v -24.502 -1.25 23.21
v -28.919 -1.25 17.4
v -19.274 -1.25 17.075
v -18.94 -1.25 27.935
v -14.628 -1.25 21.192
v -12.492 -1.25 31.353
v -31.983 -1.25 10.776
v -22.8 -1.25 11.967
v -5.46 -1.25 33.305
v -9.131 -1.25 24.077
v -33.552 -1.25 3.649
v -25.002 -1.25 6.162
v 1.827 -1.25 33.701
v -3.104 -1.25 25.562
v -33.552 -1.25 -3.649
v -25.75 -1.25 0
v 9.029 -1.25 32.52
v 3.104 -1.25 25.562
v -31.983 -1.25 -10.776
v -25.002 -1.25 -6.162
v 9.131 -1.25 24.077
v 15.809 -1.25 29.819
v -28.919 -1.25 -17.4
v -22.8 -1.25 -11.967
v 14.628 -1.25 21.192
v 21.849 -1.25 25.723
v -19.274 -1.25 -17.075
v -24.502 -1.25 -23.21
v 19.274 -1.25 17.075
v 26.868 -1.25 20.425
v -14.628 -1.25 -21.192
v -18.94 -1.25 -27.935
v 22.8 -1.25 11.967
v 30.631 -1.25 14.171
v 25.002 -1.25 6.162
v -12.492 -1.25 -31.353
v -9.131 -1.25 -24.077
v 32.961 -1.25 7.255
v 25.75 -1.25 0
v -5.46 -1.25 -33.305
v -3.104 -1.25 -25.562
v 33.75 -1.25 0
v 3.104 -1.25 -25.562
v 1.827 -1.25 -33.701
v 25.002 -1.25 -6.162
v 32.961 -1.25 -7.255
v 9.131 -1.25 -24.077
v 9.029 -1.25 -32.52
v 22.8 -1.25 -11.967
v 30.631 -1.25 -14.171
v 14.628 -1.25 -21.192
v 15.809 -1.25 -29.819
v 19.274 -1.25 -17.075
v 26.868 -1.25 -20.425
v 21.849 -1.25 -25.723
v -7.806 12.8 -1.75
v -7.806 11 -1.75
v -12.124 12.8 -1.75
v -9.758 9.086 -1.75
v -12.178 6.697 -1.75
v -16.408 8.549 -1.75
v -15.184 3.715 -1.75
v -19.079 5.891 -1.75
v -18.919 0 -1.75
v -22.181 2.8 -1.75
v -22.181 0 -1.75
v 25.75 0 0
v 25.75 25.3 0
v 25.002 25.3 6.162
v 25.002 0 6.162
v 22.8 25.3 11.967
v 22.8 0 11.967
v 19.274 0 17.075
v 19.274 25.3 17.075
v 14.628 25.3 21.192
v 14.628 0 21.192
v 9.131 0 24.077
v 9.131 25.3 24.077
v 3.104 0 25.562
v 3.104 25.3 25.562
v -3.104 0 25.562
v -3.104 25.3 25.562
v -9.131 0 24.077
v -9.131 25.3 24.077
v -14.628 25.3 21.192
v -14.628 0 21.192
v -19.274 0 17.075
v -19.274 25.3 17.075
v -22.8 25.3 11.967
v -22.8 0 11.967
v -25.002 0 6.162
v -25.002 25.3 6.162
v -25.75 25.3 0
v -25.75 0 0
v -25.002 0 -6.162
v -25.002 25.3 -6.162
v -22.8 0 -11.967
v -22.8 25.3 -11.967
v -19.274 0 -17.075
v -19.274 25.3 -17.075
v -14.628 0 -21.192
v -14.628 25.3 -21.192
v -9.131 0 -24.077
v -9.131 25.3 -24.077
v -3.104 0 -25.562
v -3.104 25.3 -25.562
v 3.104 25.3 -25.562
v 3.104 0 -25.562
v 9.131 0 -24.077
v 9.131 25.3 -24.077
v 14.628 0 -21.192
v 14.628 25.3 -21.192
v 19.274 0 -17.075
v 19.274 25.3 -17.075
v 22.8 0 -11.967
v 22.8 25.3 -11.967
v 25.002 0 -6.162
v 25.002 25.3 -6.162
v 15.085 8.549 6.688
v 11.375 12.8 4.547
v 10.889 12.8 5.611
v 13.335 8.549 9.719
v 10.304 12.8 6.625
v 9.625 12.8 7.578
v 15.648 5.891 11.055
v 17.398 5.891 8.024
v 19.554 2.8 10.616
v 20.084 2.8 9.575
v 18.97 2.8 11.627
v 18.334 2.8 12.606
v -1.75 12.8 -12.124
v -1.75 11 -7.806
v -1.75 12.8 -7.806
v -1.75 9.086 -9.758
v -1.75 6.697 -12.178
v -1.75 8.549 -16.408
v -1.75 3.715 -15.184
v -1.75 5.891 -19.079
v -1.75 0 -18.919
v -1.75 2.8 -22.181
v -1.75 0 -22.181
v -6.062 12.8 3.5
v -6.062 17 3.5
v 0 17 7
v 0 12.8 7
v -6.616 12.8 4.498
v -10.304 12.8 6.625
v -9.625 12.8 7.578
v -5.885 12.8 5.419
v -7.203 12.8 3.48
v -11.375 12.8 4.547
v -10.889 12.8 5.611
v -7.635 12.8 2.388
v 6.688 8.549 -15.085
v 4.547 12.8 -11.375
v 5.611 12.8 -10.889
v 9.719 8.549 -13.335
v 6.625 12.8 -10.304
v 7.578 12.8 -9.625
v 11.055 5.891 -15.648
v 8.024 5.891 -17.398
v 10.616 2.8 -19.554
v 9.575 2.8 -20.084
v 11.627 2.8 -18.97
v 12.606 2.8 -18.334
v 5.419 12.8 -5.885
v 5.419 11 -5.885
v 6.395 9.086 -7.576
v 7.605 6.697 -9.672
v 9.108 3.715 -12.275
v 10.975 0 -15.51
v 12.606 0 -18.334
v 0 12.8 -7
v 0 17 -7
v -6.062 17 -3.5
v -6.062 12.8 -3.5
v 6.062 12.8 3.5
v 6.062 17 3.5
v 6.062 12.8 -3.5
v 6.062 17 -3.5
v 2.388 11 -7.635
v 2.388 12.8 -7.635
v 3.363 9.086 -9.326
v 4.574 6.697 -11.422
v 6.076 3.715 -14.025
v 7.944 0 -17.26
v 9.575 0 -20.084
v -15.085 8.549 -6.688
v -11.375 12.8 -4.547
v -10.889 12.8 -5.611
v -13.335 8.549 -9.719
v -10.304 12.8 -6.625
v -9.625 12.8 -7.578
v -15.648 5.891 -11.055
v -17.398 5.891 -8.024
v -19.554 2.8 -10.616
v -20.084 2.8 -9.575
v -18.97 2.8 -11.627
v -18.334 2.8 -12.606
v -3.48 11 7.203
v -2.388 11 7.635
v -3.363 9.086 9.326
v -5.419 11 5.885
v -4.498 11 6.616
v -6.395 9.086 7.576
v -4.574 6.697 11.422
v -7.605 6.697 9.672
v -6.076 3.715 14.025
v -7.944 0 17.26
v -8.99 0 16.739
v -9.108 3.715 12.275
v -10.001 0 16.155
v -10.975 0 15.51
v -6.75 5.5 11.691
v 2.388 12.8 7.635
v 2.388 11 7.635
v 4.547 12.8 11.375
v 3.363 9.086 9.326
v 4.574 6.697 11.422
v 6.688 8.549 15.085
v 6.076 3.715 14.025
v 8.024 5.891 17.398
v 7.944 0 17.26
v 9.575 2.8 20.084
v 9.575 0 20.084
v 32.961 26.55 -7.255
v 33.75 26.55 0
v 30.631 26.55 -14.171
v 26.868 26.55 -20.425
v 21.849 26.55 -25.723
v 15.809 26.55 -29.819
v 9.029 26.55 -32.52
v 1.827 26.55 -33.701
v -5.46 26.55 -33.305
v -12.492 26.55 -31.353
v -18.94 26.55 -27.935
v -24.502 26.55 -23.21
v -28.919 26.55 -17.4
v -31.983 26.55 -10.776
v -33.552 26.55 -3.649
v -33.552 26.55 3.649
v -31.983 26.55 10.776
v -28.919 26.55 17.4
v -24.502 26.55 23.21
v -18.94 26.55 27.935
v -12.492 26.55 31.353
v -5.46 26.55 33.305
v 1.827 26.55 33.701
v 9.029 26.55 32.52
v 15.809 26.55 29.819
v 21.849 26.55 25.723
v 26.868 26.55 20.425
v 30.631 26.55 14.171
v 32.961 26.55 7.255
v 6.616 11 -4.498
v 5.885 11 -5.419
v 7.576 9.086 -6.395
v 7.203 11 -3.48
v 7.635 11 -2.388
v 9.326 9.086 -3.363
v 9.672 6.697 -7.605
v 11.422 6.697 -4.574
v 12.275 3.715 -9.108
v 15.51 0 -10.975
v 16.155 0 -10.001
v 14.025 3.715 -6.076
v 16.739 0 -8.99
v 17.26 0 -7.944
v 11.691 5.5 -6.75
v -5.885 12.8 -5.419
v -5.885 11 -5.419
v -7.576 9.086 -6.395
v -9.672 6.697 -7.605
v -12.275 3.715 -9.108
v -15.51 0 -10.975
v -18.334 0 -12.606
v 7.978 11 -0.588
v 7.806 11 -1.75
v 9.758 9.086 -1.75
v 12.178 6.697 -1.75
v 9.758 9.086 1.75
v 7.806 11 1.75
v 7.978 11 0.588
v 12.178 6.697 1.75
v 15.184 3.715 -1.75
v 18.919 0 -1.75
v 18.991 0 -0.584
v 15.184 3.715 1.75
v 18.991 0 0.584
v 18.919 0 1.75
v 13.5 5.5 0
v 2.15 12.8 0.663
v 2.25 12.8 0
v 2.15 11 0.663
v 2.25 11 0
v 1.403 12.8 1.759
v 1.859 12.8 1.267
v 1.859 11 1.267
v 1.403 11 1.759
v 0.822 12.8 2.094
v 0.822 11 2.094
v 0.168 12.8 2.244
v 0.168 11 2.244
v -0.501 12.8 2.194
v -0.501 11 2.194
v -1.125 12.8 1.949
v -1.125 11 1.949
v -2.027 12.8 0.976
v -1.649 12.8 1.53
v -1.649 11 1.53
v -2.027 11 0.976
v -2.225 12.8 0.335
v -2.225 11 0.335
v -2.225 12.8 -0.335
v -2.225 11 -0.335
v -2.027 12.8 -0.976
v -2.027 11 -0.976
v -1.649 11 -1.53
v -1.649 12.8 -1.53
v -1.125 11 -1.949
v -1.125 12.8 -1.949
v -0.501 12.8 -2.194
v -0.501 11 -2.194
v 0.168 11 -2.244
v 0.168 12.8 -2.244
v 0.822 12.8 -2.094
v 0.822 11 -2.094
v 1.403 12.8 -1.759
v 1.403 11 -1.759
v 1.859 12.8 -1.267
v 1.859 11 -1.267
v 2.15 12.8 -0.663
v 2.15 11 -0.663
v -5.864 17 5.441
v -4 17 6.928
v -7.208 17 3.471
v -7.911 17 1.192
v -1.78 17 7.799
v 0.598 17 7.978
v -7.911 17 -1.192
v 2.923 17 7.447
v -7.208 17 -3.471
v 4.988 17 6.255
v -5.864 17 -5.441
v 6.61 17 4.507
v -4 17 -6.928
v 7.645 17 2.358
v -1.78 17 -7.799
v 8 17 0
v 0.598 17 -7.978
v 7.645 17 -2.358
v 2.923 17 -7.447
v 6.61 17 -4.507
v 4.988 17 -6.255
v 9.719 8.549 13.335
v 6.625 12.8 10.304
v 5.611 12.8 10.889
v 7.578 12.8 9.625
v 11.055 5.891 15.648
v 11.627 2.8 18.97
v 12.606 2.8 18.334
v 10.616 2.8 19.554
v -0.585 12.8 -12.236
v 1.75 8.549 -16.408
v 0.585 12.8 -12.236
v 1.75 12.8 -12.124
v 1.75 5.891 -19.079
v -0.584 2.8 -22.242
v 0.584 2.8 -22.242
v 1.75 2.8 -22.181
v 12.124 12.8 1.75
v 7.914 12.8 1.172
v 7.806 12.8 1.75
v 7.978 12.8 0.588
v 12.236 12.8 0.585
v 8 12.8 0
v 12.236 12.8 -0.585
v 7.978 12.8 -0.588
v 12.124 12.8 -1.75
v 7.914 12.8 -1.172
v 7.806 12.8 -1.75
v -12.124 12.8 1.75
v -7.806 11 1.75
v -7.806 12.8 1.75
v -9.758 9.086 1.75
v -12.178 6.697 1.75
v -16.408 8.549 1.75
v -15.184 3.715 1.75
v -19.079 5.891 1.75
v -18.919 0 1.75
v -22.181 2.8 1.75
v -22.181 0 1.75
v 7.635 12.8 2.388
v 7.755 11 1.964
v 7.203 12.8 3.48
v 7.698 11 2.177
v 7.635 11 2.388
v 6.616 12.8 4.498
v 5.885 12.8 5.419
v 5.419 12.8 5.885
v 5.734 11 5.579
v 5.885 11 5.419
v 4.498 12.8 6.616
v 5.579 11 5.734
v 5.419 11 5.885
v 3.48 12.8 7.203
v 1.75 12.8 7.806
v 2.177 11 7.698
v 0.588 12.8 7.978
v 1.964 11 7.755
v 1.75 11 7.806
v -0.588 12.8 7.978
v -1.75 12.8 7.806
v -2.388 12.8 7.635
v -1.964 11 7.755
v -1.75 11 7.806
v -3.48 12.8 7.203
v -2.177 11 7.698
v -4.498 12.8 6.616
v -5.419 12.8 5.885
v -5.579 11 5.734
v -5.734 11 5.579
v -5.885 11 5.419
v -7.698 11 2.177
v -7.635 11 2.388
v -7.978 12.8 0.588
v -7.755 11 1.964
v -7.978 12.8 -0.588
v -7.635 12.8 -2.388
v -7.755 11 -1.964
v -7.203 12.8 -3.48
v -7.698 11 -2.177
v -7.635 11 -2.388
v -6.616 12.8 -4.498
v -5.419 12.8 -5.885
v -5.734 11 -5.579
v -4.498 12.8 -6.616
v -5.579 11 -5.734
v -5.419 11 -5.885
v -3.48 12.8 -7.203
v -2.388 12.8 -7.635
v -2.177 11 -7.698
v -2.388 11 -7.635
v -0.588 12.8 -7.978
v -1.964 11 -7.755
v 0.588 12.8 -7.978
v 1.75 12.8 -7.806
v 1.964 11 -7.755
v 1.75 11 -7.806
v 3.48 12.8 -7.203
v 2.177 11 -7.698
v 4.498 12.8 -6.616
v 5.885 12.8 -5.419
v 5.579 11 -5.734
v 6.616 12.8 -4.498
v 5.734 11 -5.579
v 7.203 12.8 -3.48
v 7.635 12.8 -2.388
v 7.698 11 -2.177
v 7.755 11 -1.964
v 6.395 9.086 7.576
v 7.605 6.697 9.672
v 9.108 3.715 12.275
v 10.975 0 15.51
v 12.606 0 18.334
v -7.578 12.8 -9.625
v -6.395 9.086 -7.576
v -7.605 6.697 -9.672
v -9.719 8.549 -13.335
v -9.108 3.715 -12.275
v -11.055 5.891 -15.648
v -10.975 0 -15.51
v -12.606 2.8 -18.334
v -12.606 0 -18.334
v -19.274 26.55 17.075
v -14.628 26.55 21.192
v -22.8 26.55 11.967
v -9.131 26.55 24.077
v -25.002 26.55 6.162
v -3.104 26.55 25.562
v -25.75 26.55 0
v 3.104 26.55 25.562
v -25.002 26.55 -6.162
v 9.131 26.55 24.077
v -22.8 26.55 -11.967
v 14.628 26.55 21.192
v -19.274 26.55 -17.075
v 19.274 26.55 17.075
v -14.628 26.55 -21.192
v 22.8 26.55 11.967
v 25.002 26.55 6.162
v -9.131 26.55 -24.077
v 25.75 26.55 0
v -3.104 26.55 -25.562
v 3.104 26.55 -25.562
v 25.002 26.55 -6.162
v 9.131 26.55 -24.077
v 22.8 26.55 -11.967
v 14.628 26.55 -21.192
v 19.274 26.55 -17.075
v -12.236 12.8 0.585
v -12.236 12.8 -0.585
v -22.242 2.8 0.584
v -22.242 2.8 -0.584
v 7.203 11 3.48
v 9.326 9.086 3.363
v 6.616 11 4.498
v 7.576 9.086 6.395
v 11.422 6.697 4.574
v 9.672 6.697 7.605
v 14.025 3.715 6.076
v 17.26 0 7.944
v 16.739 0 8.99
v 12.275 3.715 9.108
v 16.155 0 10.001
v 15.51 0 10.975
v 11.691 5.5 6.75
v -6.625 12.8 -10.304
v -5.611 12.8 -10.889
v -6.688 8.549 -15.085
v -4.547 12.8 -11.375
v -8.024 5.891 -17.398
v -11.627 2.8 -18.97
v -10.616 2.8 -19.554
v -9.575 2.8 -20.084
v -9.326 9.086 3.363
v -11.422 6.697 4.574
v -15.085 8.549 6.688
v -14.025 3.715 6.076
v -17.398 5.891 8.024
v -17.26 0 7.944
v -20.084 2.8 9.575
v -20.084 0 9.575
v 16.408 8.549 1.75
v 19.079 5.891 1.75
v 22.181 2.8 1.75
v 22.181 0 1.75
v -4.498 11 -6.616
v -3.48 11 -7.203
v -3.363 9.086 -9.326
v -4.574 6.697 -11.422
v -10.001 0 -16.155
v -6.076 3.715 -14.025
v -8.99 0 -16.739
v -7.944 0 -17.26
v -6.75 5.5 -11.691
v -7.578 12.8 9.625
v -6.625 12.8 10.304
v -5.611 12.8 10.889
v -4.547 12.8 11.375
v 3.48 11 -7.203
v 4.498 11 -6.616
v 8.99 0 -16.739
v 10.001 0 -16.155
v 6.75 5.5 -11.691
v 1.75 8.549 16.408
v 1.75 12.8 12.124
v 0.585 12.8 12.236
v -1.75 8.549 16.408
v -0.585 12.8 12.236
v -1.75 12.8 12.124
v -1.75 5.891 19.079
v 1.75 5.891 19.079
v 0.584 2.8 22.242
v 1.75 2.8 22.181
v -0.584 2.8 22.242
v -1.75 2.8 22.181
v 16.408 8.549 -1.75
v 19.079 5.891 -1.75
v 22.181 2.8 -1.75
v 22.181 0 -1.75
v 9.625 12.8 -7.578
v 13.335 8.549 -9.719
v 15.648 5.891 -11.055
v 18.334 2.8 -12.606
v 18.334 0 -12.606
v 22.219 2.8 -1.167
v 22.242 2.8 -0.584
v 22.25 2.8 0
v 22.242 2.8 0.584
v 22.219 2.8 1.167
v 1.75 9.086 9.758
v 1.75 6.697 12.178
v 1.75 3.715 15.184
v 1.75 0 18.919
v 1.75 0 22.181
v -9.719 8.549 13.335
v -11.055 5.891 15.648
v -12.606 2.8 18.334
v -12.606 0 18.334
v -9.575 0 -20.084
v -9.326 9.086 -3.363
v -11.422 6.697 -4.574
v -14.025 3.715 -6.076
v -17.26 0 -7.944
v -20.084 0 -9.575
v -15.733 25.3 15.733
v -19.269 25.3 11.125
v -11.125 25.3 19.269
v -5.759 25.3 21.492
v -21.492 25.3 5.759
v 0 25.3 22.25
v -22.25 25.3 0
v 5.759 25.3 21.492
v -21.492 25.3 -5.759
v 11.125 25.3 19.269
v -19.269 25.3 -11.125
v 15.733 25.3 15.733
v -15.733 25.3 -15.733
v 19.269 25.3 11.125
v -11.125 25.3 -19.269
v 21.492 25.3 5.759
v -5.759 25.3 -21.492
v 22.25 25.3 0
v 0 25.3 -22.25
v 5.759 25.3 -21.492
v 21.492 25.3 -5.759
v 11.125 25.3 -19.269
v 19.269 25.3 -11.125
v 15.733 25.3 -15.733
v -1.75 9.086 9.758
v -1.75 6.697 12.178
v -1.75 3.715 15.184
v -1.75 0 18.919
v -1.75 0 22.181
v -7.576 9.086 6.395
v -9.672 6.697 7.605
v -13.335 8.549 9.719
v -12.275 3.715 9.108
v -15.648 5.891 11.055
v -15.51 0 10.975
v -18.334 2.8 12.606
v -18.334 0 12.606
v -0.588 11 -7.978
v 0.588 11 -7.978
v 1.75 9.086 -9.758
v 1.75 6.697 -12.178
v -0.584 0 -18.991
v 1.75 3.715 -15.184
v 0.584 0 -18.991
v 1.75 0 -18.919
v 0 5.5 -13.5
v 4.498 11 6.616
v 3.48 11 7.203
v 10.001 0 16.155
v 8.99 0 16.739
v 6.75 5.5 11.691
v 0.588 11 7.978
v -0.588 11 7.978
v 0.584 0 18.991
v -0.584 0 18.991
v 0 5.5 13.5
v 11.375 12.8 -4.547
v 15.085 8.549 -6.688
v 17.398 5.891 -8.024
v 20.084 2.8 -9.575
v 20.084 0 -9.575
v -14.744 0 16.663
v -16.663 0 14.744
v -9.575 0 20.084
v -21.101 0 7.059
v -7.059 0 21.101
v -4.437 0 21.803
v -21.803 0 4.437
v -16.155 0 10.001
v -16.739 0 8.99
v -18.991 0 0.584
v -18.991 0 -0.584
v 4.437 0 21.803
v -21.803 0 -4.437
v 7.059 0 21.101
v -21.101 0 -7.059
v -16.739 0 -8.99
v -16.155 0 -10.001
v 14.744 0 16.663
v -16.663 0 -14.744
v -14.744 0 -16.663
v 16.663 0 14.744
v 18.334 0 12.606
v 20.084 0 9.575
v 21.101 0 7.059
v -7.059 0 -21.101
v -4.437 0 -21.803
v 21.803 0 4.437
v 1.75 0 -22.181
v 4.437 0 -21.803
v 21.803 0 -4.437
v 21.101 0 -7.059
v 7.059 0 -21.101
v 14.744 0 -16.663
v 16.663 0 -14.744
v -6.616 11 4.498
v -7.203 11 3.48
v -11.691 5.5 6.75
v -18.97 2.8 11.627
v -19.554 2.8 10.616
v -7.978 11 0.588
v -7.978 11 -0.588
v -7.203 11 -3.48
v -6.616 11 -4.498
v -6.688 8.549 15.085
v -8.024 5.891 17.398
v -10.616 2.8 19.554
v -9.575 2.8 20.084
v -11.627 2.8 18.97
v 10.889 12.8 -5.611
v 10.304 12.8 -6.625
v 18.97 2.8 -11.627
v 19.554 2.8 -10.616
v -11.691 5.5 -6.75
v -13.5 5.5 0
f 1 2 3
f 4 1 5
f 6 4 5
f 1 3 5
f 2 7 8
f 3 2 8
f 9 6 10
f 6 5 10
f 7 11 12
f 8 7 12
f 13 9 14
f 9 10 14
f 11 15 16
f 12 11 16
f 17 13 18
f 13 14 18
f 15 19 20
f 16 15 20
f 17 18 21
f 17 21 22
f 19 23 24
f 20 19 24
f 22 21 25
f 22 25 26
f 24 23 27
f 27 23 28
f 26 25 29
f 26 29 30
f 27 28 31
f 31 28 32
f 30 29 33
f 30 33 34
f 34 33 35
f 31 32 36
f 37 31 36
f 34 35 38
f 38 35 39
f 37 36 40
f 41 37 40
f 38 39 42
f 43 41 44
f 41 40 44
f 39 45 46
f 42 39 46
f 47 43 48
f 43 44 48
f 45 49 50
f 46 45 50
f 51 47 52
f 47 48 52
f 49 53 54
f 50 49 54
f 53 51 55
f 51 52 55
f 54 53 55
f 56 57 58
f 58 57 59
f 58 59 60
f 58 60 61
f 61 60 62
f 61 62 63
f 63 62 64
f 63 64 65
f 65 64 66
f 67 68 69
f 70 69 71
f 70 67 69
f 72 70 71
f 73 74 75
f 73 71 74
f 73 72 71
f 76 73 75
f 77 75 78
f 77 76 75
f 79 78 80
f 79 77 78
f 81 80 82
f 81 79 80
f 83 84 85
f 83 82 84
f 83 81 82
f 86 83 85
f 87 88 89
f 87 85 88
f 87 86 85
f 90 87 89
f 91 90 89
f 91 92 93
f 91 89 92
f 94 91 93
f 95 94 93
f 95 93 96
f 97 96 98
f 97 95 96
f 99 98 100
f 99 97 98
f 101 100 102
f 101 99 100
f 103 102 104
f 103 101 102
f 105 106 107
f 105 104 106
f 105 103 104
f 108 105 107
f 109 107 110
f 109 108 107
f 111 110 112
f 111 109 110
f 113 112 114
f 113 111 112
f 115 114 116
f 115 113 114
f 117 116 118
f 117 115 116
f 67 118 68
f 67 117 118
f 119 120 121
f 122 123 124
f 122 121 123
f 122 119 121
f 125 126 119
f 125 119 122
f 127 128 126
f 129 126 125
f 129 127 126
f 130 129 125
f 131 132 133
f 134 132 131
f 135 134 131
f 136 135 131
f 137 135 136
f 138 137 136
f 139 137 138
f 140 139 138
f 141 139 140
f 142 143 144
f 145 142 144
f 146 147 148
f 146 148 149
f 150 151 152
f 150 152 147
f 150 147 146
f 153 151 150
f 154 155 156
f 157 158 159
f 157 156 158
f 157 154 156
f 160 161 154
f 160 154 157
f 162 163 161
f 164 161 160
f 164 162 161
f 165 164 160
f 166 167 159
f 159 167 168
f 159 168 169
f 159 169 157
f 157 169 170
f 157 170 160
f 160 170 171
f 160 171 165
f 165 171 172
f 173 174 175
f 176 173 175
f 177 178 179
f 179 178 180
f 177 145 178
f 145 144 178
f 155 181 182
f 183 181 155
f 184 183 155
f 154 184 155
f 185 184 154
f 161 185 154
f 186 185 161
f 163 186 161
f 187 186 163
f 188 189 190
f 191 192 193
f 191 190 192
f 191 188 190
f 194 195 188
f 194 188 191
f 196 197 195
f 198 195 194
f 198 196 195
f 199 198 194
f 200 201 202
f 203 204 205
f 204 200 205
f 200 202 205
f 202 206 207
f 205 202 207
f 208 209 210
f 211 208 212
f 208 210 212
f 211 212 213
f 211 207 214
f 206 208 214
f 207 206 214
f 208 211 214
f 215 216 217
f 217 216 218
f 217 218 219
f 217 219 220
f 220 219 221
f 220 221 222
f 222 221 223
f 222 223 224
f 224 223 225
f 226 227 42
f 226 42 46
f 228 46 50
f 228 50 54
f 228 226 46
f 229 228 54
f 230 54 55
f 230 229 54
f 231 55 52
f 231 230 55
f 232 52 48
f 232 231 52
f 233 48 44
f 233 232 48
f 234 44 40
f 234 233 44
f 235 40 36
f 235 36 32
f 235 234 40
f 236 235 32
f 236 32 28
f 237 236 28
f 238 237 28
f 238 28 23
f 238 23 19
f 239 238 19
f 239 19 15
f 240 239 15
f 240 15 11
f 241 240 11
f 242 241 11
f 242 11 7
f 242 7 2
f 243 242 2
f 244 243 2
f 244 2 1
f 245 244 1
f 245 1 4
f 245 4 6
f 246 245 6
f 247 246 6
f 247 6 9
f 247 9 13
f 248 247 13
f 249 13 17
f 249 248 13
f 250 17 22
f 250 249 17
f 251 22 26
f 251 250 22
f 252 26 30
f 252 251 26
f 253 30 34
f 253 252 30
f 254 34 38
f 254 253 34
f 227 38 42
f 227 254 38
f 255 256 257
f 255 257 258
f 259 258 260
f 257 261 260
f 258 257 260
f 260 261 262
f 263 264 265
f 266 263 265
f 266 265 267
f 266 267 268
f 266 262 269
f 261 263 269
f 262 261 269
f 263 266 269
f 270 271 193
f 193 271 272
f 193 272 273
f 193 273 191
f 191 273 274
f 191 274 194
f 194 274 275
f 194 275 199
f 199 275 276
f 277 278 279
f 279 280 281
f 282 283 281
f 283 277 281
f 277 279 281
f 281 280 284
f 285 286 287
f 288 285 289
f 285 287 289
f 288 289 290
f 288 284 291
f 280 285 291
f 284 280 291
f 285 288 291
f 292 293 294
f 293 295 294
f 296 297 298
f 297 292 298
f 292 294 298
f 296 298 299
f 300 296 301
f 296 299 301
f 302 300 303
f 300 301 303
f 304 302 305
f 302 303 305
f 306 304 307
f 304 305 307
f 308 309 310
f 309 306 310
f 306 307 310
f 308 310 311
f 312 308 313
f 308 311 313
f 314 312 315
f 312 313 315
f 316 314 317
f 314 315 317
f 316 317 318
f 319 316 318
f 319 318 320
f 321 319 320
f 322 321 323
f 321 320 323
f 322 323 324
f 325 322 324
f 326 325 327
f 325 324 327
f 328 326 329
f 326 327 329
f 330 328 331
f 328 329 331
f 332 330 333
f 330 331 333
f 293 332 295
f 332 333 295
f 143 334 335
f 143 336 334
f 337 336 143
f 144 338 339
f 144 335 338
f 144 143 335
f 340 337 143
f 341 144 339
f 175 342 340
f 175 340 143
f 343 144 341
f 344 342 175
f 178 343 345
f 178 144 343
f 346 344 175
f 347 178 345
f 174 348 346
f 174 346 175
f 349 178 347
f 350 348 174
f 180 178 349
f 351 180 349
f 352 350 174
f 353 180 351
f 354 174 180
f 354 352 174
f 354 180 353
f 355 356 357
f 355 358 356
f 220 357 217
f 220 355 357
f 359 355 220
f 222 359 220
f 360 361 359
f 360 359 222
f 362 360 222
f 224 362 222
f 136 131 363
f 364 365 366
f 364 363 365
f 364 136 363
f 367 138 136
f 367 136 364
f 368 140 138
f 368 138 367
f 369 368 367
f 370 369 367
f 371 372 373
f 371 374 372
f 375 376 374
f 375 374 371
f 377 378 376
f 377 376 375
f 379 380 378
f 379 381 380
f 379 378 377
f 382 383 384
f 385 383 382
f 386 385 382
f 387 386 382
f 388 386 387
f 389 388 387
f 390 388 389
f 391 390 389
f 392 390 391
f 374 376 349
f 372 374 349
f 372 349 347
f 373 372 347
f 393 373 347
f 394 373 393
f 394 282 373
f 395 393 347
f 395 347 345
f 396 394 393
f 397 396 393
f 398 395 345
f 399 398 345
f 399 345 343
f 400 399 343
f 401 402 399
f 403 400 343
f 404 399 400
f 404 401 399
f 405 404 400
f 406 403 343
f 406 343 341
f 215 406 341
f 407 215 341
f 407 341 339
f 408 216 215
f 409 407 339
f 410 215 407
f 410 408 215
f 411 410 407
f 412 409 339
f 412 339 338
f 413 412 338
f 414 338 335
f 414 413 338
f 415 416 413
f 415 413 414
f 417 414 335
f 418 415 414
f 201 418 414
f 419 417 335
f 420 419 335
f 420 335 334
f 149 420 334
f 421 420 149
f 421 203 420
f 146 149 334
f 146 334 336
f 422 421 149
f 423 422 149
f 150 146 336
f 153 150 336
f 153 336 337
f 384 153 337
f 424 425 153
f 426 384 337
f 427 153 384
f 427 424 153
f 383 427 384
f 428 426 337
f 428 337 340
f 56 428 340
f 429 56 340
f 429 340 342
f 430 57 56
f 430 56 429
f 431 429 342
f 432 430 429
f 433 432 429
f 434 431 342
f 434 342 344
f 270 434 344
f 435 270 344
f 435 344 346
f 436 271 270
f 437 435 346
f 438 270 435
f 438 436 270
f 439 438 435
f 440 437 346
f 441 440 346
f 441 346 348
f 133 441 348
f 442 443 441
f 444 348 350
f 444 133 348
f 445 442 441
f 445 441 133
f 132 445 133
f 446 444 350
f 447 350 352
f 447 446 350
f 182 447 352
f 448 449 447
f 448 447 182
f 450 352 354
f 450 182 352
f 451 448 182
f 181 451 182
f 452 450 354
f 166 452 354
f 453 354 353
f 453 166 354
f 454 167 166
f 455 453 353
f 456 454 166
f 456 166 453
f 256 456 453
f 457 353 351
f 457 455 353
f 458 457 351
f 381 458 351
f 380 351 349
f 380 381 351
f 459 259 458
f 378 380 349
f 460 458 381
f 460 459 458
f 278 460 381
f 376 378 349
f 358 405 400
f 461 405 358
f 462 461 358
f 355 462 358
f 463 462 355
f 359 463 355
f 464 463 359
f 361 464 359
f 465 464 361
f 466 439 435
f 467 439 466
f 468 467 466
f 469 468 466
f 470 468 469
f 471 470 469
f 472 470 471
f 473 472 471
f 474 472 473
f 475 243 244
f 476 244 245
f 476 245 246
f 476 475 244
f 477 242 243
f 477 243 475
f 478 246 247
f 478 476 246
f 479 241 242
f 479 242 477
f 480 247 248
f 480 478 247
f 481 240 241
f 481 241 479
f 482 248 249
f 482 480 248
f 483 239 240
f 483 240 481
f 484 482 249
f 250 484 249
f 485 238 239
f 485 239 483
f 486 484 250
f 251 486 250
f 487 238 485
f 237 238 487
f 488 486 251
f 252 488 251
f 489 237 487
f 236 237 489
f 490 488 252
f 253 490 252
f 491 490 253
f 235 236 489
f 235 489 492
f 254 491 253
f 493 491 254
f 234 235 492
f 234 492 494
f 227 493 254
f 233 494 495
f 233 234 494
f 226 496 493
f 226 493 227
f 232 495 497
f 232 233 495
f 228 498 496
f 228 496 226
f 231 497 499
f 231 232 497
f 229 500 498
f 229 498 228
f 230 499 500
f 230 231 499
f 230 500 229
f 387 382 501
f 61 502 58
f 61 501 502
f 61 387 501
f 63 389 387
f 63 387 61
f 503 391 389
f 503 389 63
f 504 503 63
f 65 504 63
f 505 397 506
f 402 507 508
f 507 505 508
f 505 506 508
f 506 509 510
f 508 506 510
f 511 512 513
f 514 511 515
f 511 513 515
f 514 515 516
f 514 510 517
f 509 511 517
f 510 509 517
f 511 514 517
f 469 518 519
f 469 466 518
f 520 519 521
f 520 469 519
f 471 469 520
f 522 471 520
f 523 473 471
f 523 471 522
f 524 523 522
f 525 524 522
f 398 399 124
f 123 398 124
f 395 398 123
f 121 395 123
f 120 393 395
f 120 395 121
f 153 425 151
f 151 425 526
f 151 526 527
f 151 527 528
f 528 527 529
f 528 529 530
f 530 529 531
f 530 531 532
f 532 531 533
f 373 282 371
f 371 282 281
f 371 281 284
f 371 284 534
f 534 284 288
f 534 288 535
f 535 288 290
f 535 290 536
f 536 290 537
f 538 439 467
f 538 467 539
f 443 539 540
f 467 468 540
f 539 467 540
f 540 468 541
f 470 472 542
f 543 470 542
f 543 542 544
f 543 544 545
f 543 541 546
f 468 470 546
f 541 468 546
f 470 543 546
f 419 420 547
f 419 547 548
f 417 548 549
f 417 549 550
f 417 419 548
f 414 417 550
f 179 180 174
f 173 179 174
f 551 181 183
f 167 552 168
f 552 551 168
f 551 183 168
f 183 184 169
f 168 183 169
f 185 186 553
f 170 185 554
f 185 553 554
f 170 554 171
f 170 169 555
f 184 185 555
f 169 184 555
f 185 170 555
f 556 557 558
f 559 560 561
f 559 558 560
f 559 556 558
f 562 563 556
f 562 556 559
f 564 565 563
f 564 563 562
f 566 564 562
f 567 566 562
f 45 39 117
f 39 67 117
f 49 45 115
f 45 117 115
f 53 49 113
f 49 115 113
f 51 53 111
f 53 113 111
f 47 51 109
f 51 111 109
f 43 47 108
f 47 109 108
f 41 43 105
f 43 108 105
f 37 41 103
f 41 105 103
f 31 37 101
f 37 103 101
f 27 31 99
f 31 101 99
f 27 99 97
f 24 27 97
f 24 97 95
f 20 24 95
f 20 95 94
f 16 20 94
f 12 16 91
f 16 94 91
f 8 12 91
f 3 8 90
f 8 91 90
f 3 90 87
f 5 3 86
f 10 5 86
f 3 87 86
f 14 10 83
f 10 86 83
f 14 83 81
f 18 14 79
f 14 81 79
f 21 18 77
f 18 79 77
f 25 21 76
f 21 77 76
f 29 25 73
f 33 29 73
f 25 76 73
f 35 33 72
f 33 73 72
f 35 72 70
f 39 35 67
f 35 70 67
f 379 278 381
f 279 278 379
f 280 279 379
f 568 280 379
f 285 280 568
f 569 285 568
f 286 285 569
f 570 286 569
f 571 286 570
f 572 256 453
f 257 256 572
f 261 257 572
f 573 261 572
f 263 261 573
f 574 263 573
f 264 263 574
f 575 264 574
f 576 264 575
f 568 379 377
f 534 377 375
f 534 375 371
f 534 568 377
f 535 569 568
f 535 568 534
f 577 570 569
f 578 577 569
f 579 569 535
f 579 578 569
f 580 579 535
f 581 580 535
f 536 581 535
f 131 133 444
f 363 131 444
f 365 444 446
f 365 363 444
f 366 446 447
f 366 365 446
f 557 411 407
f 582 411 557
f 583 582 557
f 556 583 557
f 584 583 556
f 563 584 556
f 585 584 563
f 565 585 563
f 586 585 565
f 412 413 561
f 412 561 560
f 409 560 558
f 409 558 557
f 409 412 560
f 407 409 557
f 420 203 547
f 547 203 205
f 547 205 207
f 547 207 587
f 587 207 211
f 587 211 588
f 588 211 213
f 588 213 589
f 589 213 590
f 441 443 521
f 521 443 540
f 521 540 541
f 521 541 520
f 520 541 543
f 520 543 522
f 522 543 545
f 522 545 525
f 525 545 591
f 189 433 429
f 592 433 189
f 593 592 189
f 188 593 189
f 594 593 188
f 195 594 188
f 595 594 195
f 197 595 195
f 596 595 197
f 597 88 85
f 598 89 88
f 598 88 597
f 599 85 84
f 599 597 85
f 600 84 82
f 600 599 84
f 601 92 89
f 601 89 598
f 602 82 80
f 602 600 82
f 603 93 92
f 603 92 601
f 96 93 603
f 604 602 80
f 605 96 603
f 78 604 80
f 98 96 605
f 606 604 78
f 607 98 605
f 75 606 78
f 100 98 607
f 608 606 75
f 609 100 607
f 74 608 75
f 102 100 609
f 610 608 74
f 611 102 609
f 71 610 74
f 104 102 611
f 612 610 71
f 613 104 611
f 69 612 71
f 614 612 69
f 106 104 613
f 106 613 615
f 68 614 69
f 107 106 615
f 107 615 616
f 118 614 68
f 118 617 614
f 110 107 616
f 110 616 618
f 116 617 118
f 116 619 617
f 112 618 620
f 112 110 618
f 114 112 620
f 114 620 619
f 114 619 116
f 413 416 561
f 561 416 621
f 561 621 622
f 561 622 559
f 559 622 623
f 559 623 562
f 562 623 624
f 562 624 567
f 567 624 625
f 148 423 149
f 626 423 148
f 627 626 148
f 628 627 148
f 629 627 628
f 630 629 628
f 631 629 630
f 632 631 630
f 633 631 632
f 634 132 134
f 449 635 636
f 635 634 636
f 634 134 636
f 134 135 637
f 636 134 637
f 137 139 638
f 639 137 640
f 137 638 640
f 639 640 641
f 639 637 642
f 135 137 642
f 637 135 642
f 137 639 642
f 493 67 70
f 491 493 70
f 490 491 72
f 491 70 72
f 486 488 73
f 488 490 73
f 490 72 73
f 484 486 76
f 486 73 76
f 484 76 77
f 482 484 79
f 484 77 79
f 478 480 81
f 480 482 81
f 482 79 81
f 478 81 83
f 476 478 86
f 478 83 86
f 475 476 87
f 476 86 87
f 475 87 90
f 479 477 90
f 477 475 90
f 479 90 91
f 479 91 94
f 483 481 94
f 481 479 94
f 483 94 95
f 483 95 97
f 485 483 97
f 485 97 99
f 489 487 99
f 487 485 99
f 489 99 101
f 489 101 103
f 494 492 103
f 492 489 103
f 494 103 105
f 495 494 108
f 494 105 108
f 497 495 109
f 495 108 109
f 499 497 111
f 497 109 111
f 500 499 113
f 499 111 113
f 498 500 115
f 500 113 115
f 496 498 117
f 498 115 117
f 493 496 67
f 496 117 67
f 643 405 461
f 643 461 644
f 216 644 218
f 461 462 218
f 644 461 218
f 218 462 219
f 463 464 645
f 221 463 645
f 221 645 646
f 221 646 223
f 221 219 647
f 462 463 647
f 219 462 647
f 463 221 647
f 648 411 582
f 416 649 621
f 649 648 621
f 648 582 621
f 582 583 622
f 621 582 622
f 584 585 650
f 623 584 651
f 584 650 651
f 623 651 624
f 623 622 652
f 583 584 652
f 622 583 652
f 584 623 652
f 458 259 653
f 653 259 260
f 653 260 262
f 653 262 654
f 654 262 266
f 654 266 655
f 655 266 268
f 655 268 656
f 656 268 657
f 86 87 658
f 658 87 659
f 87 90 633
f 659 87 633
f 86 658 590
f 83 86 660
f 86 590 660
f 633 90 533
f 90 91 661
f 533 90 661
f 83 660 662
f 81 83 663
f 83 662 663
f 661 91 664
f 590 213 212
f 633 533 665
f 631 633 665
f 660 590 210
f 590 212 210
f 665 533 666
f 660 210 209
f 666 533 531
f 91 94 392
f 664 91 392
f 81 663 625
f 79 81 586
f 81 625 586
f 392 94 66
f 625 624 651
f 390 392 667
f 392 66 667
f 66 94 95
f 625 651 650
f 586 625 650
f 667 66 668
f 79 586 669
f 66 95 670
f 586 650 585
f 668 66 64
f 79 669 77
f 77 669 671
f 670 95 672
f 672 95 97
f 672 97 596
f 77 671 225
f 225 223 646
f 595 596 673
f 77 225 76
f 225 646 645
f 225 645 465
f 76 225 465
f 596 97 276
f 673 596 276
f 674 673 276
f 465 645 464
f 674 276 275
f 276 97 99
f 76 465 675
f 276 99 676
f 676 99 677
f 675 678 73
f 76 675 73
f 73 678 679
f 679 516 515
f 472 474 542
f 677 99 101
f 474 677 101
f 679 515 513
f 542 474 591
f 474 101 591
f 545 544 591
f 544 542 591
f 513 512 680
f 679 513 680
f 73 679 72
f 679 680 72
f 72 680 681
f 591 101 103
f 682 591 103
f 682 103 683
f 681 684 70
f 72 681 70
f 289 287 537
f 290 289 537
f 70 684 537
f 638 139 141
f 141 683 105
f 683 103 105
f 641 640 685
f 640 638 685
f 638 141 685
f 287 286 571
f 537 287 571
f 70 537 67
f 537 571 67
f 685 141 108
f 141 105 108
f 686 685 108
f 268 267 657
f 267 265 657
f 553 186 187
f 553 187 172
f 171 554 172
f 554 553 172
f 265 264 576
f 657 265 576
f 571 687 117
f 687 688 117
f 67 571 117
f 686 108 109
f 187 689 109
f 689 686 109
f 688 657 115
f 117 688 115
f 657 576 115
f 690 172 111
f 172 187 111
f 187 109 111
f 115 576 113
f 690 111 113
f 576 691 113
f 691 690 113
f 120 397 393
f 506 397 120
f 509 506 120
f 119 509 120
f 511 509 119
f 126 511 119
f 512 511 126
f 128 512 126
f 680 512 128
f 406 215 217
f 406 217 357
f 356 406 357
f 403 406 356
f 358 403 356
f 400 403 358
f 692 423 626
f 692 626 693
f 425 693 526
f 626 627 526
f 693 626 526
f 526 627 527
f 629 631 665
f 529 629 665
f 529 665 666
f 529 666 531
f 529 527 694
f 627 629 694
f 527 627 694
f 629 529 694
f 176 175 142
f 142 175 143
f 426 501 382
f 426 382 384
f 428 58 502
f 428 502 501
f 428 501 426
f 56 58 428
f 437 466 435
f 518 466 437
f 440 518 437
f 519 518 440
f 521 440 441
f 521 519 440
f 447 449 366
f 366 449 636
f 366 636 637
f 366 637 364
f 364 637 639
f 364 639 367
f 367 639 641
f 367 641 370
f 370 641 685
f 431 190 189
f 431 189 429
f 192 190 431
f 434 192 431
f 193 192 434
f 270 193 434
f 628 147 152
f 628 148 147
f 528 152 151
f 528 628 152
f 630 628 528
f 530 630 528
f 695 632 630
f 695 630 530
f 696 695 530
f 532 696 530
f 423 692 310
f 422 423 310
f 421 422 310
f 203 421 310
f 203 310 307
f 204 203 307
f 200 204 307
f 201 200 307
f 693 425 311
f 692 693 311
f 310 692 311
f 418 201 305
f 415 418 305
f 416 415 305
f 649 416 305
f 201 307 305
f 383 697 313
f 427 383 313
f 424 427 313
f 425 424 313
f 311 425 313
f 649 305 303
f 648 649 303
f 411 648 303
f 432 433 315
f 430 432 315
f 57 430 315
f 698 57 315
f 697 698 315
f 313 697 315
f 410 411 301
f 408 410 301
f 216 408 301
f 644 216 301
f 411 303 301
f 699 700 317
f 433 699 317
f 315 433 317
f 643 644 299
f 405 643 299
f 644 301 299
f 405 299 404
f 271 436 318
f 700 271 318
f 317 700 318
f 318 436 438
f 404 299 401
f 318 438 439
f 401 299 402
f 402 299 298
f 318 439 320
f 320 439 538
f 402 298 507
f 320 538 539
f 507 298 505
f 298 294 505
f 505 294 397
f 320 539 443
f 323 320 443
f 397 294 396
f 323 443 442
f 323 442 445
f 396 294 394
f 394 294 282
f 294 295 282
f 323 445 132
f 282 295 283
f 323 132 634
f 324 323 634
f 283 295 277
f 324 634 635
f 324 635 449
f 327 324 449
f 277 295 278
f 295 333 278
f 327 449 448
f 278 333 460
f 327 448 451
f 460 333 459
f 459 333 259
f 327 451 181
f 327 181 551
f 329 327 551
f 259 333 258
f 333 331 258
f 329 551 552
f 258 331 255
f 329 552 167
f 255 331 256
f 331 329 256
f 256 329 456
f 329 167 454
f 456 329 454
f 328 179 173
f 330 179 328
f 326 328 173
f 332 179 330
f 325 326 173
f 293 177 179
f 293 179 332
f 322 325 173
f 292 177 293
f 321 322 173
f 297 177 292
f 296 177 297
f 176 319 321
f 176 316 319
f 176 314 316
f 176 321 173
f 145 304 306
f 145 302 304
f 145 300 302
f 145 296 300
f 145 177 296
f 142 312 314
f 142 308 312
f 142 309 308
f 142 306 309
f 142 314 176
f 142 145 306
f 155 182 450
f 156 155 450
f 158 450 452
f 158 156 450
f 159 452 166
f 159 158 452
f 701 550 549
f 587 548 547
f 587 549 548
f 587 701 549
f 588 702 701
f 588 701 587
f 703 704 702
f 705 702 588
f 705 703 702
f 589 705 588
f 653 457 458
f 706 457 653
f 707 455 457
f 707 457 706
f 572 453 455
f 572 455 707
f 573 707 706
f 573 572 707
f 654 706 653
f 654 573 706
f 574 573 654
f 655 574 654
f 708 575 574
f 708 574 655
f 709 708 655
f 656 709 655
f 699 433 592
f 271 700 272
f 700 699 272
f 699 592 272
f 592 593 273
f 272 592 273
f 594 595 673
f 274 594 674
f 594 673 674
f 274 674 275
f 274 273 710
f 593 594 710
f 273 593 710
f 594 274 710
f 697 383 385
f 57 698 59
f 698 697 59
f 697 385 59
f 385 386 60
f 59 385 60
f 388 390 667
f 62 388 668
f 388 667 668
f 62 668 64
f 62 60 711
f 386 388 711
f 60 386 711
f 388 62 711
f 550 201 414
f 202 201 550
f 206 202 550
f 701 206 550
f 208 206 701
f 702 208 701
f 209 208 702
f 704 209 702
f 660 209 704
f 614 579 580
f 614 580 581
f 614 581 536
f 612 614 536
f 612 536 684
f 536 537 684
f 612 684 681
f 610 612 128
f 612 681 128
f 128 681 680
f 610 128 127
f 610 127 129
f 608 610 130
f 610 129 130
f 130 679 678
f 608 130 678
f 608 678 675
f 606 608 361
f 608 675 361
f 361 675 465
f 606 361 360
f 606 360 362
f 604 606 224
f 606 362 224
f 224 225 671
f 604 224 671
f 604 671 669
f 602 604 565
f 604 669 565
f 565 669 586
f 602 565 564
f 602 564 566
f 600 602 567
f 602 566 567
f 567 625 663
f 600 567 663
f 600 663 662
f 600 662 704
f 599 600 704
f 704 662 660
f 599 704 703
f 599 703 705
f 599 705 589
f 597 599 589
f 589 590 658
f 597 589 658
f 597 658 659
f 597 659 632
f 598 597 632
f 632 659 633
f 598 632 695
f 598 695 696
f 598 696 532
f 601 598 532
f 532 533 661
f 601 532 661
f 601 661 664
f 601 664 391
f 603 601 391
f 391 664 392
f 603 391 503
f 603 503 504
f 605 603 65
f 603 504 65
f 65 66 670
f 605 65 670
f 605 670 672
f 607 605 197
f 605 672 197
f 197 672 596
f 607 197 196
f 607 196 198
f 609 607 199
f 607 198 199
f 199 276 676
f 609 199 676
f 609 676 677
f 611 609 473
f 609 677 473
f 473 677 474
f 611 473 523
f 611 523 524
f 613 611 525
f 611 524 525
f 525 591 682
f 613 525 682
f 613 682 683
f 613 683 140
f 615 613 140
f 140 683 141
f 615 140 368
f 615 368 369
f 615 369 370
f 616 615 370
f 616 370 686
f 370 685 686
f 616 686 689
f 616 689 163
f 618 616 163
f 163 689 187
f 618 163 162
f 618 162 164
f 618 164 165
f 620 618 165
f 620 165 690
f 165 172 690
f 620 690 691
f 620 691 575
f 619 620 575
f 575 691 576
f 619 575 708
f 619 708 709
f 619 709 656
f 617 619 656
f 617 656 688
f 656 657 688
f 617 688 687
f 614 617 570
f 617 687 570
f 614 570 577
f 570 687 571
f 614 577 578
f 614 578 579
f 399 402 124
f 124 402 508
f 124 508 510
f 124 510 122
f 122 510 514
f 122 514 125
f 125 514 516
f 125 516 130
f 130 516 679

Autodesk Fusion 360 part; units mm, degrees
sketch "Sketch1" plane through (0, 0, 0) normal (0, 1, 0) x (1, 0, 0) in component "hub"
  circle A0 centre (0, 0) radius 25.75
  circle A1 centre (0, 0) radius 2.25
  circle A2 centre (0, 0) radius 22.25
  circle A3 centre (0, 0) radius 8
  line L0 (0, 0) -> (1.75, 0) construction
  line L1 (0, 0) -> (-1.75, 0) construction
  line L2 (-1.75, 0) -> (-1.75, -7.8062) construction
  line L3 (1.75, 0) -> (1.75, -7.8062) construction
  line L4 (-1.75, -7.8062) -> (-1.75, -22.1811)
  line L5 (1.75, -7.8062) -> (1.75, -22.1811)
  line L6 (2.3876, -7.6354) -> (9.575, -20.0844)
  line L7 (5.4187, -5.8854) -> (12.6061, -18.3344)
  line L8 (5.8854, -5.4187) -> (18.3344, -12.6061)
  line L9 (7.6354, -2.3876) -> (20.0844, -9.575)
  line L10 (7.8062, -1.75) -> (22.1811, -1.75)
  line L11 (7.8062, 1.75) -> (22.1811, 1.75)
  line L12 (7.6354, 2.3876) -> (20.0844, 9.575)
  line L13 (5.8854, 5.4187) -> (18.3344, 12.6061)
  line L14 (5.4187, 5.8854) -> (12.6061, 18.3344)
  line L15 (2.3876, 7.6354) -> (9.575, 20.0844)
  line L16 (1.75, 7.8062) -> (1.75, 22.1811)
  line L17 (-1.75, 7.8062) -> (-1.75, 22.1811)
  line L18 (-2.3876, 7.6354) -> (-9.575, 20.0844)
  line L19 (-5.4187, 5.8854) -> (-12.6061, 18.3344)
  line L20 (-5.8854, 5.4187) -> (-18.3344, 12.6061)
  line L21 (-7.6354, 2.3876) -> (-20.0844, 9.575)
  line L22 (-7.8062, 1.75) -> (-22.1811, 1.75)
  line L23 (-7.8062, -1.75) -> (-22.1811, -1.75)
  line L24 (-7.6354, -2.3876) -> (-20.0844, -9.575)
  line L25 (-5.8854, -5.4187) -> (-18.3344, -12.6061)
  line L26 (-5.4187, -5.8854) -> (-12.6061, -18.3344)
  line L27 (-2.3876, -7.6354) -> (-9.575, -20.0844)
  dimension "d28" = 51.5
  dimension "d29" = 4.5
  dimension "d30" = 44.5
  dimension "d33" = 16
  dimension "d40" = 1.75
  dimension "d41" = 1.75
  dimension "d43" = 360
extrude "Extrude1" add sketch "Sketch1" along normal blind 25.3 contours A0 makes body 1 in component "hub"
extrude "Extrude2" add sketch "Sketch1" along normal blind 6 from surface at 11 separate body contours A3 makes body 2 in component "hub"
sketch "Sketch2" plane through (0, 17, 0) normal (0, 1, 0) x (-1, 0, 0) in component "hub"
  circle A0 centre (0, 0) radius 2.25
  circle A1 centre (0, 0) radius 8
  line L0 (0, -7) -> (6.0622, -3.5)
  line L1 (6.0622, -3.5) -> (6.0622, 3.5)
  line L2 (6.0622, 3.5) -> (0, 7)
  line L3 (0, 7) -> (-6.0622, 3.5)
  line L4 (-6.0622, 3.5) -> (-6.0622, -3.5)
  line L5 (-6.0622, -3.5) -> (0, -7)
  dimension "d37" = 7
extrude "Extrude3" cut sketch "Sketch2" against normal blind 4.2 contours L0 L1 L2 L3 L4 L5 bodies 2 in component "hub"
extrude "Extrude4" add sketch "Sketch1" along normal up to surface (12.8 mm away) separate body contours A2 A3 L10 L11 | A2 A3 L12 L13 | A2 A3 L8 L9 | A2 A3 L14 L15 | A2 A3 L6 L7 | A2 A3 L16 L17 | A2 A3 L4 L5 | A2 A3 L18 L19 | A2 A3 L26 L27 | A2 A3 L20 L21 | A2 A3 L24 L25 | A2 A3 L22 L23 makes body 3 at (-7.8145, 4.2667, 10.0351) makes body 4 at (4.7834, 4.2667, 11.7851) makes body 5 at (4.7834, 4.2667, -11.7851) makes body 6 at (11.7851, 4.2667, -4.7834) makes body 7 at (10.0351, 4.2667, 7.8145) makes body 8 at (-11.7851, 8.5333, 4.7834) makes body 9 at (-12.5979, 8.5333, -1.75) makes body 10 at (12.5979, 8.5333, 1.75) makes body 11 at (-4.7834, 4.2667, -11.7851) makes body 12 at (1.75, 8.5333, -12.5979) makes body 13 at (-10.0351, 8.5333, -7.8145) makes body 14 at (-1.75, 8.5333, 12.5979) in component "hub"
chamfer "Chamfer1" distance 11 angle 45 12 edges at (6.9282, 0, -4) (6.9282, 0, 4) (-8, 0, 0) (-6.9282, 0, 4) (8, 0, 0) (0, 0, -8) (4, 0, -6.9282) (-4, 0, -6.9282) (0, 0, 8) (4, 0, 6.9282) (-4, 0, 6.9282) (-6.9282, 0, -4) on bodies 3 4 5 6 7 8 9 10 11 12 13 14 in component "hub"
chamfer "Chamfer1" distance 10 angle 45 11 edges at (19.2691, 12.8, -11.125) (19.2691, 12.8, 11.125) (-22.25, 12.8, 0) (-19.2691, 12.8, 11.125) (0, 12.8, -22.25) (11.125, 12.8, -19.2691) (-11.125, 12.8, -19.2691) (0, 12.8, 22.25) (11.125, 12.8, 19.2691) (-11.125, 12.8, 19.2691) (-19.2691, 12.8, -11.125) on bodies 3 4 5 6 7 8 9 10 11 12 13 14 in component "hub"
chamfer "Chamfer1" distance 10 angle 45 1 edges at (22.25, 12.8, 0) on bodies 3 4 5 6 7 8 9 10 11 12 13 14 in component "hub"
combine "Combine1" operation add target body 1 tool bodies 11 13 9 8 3 14 4 7 10 6 5 12 2 in component "hub"
sketch "Sketch1 (2)" plane through (0, 0, 0) normal (0, 1, 0) x (1, 0, 0) in component "Wheel"
  circle A0 centre (0, 0) radius 25.75
  circle A1 centre (0, 0) radius 33.75
  dimension "d49" = 67.5
extrude "Extrude1'" add sketch "Sketch1 (2)" along normal up to surface (25.3 mm away) separate body makes body 15 in component "Wheel"
extrude "Extrude2'" add 1 faces at (30.8618, 25.3, 2.956) along direction (0, 1, 0) blind 1.25 on bodies 15 bodies 15 in component "Wheel"
extrude "Extrude3'" add 1 faces at (30.8618, 0, 2.956) along direction (0, -1, 0) blind 1.25 on bodies 15 bodies 15 in component "Wheel"
component "hub" placed x (1, 0, 0) y (0, 1, 0) z (0, 0, 1) at (0, 0, 0)
component "Wheel" placed x (1, 0, 0) y (0, 1, 0) z (0, 0, 1) at (0, 0, 0)
equation "d37 = ( 14 / 2 ) * 1 mm"
equation "d40 = ( 3.5 / 2 ) * 1 mm"
equation "d41 = d40"
equation "d52 = ( ( 27.5 - 25 ) / 2 ) * 1 mm"
equation "d54 = ( ( 27.5 - 25 ) / 2 ) * 1 mm"
